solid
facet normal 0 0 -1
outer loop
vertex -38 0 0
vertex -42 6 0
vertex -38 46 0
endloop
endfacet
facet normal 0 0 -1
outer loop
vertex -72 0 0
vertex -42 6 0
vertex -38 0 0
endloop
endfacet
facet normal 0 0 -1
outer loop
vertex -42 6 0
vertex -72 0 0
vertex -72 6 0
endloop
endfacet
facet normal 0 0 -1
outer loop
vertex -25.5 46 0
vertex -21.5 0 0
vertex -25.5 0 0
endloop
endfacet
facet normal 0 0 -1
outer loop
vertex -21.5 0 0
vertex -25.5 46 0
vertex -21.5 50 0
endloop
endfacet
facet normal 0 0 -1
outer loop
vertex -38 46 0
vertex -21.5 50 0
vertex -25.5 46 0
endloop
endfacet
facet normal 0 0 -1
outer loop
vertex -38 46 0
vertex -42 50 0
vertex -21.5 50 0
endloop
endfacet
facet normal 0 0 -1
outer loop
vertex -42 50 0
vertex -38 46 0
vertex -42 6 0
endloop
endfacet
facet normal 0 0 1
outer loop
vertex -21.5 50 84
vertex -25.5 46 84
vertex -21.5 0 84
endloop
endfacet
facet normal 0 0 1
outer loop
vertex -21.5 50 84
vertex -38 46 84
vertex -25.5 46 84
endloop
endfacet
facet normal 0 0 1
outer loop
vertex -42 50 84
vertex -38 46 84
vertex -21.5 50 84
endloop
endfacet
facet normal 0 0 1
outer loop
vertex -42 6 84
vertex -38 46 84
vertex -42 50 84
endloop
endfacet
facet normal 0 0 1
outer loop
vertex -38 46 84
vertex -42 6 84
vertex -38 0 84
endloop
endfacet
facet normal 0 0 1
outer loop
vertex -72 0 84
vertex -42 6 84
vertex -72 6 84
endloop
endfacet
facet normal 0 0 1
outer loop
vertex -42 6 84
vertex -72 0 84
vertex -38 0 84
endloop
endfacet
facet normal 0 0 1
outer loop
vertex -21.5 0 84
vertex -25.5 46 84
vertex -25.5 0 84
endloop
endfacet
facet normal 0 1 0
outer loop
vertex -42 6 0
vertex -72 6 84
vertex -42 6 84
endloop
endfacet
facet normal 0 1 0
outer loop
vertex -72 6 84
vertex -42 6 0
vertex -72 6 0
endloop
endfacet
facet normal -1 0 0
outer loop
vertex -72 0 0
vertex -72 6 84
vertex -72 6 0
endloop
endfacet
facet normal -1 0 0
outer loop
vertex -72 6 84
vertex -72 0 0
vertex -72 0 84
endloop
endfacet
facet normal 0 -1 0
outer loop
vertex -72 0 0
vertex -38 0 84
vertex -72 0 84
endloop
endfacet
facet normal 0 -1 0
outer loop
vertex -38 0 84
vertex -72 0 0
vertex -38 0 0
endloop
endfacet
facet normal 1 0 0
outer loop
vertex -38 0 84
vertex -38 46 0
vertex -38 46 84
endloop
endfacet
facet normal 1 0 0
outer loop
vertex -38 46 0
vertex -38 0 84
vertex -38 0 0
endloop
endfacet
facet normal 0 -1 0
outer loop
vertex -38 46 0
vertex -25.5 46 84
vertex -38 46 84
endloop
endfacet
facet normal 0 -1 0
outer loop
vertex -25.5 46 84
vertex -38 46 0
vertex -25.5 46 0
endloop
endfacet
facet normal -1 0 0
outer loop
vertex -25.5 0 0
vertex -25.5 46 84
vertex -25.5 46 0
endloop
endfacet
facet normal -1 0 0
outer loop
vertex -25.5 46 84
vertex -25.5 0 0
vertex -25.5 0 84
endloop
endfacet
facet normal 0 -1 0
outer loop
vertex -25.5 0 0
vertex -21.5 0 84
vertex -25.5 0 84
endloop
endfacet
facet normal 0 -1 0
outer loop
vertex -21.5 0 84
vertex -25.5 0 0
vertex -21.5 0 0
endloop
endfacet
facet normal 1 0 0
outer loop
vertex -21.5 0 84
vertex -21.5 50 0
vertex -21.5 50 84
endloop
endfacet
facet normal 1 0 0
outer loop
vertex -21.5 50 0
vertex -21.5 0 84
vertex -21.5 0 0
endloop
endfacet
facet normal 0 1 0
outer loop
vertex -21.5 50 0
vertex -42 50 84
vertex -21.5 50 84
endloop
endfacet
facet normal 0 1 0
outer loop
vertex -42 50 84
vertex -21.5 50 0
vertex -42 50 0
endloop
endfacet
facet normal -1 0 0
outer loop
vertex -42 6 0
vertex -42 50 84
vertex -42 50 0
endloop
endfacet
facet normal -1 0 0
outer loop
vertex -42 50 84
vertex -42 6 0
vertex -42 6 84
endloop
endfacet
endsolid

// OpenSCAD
// PCR Strip Holder for Ice Bucket - Corrected
// Designed to hang over a 12mm wall and hold an 8-tube PCR strip.

// --- Dimensions ---
length_x      = 84.0;    // Extrusion length along X
wall_gap      = 12.5;    // Gap for the bucket wall (16.5 - 4.0 = 12.5)
inner_leg_h    = 50.0;    // Height of the inner leg
outer_leg_h    = 50.0;    // Height of the outer leg
leg_thickness  = 4.0;     // Thickness of the legs (20.5 - 16.5 = 4.0)
bridge_h       = 4.0;     // Height of the top bridge (50 - 46 = 4)
ledge_thick    = 6.0;     // Thickness of the ledge (z = 0 to 6)
ledge_depth    = 30.0;    // Depth of the ledge into the ice (y = 0 to -30)
tube_hole_d    = 6.4;     // Diameter of the PCR tube holes
tube_pitch     = 9.0;     // Spacing between tube holes along X
num_tubes      = 8;       // Number of tubes

$fn = 64;

// --- Construction ---

// We build the 2D profile first, then extrude it along X.
// To avoid the "Mixing 2D and 3D" error, we perform the hole subtraction 
// on the 2D shape before extruding, or use 3D subtraction on the final part.
// Here, we will build the 3D part and subtract the 3D holes.

module holder_body() {
    // The profile is in the YZ plane.
    // We use a 2D shape and extrude it to create the 3D body.
    linear_extrude(height = length_x) {
        difference() {
            // The main U-shape profile
            union() {
                // Inner Leg: y from 0 to 4, z from 0 to 50
                square([4, inner_leg_h]);
                
                // Outer Leg: y from 16.5 to 20.5, z from 0 to 50
                // Note: Y starts at 16.5. In 2D, we translate.
                translate([16.5, 0]) square([leg_thickness, outer_leg_h]);
                
                // Bridge: y from 4 to 16.5, z from 46 to 50
                translate([4, 46]) square([12.5, bridge_h]);
                
                // Ledge: y from -30 to 0, z from 0 to 6
                // Note: Y starts at -30. In 2D, we translate.
                translate([-ledge_depth, 0]) square([ledge_depth, ledge_thick]);
            }
        }
    }
}

// Final Assembly
difference() {
    // Center the part on X
    translate([-length_x / 2, 0, 0]) holder_body();

    // Subtract the tube holes
    // Holes are vertical (along Z), centered on X, at y = -15
    for (i = [0 : num_tubes - 1]) {
        // Calculate X position: centered on 0
        let (x_pos = (i - (num_tubes - 1) / 2) * tube_pitch)
        // Translate to the hole location:
        // X: x_pos
        // Y: -15 (relative to the profile's Y=0)
        // Z: -1 (to ensure clean cut through the 6mm ledge)
        translate([x_pos, -15, -1]) 
            cylinder(h = ledge_thick + 2, d = tube_hole_d);
    }
}
